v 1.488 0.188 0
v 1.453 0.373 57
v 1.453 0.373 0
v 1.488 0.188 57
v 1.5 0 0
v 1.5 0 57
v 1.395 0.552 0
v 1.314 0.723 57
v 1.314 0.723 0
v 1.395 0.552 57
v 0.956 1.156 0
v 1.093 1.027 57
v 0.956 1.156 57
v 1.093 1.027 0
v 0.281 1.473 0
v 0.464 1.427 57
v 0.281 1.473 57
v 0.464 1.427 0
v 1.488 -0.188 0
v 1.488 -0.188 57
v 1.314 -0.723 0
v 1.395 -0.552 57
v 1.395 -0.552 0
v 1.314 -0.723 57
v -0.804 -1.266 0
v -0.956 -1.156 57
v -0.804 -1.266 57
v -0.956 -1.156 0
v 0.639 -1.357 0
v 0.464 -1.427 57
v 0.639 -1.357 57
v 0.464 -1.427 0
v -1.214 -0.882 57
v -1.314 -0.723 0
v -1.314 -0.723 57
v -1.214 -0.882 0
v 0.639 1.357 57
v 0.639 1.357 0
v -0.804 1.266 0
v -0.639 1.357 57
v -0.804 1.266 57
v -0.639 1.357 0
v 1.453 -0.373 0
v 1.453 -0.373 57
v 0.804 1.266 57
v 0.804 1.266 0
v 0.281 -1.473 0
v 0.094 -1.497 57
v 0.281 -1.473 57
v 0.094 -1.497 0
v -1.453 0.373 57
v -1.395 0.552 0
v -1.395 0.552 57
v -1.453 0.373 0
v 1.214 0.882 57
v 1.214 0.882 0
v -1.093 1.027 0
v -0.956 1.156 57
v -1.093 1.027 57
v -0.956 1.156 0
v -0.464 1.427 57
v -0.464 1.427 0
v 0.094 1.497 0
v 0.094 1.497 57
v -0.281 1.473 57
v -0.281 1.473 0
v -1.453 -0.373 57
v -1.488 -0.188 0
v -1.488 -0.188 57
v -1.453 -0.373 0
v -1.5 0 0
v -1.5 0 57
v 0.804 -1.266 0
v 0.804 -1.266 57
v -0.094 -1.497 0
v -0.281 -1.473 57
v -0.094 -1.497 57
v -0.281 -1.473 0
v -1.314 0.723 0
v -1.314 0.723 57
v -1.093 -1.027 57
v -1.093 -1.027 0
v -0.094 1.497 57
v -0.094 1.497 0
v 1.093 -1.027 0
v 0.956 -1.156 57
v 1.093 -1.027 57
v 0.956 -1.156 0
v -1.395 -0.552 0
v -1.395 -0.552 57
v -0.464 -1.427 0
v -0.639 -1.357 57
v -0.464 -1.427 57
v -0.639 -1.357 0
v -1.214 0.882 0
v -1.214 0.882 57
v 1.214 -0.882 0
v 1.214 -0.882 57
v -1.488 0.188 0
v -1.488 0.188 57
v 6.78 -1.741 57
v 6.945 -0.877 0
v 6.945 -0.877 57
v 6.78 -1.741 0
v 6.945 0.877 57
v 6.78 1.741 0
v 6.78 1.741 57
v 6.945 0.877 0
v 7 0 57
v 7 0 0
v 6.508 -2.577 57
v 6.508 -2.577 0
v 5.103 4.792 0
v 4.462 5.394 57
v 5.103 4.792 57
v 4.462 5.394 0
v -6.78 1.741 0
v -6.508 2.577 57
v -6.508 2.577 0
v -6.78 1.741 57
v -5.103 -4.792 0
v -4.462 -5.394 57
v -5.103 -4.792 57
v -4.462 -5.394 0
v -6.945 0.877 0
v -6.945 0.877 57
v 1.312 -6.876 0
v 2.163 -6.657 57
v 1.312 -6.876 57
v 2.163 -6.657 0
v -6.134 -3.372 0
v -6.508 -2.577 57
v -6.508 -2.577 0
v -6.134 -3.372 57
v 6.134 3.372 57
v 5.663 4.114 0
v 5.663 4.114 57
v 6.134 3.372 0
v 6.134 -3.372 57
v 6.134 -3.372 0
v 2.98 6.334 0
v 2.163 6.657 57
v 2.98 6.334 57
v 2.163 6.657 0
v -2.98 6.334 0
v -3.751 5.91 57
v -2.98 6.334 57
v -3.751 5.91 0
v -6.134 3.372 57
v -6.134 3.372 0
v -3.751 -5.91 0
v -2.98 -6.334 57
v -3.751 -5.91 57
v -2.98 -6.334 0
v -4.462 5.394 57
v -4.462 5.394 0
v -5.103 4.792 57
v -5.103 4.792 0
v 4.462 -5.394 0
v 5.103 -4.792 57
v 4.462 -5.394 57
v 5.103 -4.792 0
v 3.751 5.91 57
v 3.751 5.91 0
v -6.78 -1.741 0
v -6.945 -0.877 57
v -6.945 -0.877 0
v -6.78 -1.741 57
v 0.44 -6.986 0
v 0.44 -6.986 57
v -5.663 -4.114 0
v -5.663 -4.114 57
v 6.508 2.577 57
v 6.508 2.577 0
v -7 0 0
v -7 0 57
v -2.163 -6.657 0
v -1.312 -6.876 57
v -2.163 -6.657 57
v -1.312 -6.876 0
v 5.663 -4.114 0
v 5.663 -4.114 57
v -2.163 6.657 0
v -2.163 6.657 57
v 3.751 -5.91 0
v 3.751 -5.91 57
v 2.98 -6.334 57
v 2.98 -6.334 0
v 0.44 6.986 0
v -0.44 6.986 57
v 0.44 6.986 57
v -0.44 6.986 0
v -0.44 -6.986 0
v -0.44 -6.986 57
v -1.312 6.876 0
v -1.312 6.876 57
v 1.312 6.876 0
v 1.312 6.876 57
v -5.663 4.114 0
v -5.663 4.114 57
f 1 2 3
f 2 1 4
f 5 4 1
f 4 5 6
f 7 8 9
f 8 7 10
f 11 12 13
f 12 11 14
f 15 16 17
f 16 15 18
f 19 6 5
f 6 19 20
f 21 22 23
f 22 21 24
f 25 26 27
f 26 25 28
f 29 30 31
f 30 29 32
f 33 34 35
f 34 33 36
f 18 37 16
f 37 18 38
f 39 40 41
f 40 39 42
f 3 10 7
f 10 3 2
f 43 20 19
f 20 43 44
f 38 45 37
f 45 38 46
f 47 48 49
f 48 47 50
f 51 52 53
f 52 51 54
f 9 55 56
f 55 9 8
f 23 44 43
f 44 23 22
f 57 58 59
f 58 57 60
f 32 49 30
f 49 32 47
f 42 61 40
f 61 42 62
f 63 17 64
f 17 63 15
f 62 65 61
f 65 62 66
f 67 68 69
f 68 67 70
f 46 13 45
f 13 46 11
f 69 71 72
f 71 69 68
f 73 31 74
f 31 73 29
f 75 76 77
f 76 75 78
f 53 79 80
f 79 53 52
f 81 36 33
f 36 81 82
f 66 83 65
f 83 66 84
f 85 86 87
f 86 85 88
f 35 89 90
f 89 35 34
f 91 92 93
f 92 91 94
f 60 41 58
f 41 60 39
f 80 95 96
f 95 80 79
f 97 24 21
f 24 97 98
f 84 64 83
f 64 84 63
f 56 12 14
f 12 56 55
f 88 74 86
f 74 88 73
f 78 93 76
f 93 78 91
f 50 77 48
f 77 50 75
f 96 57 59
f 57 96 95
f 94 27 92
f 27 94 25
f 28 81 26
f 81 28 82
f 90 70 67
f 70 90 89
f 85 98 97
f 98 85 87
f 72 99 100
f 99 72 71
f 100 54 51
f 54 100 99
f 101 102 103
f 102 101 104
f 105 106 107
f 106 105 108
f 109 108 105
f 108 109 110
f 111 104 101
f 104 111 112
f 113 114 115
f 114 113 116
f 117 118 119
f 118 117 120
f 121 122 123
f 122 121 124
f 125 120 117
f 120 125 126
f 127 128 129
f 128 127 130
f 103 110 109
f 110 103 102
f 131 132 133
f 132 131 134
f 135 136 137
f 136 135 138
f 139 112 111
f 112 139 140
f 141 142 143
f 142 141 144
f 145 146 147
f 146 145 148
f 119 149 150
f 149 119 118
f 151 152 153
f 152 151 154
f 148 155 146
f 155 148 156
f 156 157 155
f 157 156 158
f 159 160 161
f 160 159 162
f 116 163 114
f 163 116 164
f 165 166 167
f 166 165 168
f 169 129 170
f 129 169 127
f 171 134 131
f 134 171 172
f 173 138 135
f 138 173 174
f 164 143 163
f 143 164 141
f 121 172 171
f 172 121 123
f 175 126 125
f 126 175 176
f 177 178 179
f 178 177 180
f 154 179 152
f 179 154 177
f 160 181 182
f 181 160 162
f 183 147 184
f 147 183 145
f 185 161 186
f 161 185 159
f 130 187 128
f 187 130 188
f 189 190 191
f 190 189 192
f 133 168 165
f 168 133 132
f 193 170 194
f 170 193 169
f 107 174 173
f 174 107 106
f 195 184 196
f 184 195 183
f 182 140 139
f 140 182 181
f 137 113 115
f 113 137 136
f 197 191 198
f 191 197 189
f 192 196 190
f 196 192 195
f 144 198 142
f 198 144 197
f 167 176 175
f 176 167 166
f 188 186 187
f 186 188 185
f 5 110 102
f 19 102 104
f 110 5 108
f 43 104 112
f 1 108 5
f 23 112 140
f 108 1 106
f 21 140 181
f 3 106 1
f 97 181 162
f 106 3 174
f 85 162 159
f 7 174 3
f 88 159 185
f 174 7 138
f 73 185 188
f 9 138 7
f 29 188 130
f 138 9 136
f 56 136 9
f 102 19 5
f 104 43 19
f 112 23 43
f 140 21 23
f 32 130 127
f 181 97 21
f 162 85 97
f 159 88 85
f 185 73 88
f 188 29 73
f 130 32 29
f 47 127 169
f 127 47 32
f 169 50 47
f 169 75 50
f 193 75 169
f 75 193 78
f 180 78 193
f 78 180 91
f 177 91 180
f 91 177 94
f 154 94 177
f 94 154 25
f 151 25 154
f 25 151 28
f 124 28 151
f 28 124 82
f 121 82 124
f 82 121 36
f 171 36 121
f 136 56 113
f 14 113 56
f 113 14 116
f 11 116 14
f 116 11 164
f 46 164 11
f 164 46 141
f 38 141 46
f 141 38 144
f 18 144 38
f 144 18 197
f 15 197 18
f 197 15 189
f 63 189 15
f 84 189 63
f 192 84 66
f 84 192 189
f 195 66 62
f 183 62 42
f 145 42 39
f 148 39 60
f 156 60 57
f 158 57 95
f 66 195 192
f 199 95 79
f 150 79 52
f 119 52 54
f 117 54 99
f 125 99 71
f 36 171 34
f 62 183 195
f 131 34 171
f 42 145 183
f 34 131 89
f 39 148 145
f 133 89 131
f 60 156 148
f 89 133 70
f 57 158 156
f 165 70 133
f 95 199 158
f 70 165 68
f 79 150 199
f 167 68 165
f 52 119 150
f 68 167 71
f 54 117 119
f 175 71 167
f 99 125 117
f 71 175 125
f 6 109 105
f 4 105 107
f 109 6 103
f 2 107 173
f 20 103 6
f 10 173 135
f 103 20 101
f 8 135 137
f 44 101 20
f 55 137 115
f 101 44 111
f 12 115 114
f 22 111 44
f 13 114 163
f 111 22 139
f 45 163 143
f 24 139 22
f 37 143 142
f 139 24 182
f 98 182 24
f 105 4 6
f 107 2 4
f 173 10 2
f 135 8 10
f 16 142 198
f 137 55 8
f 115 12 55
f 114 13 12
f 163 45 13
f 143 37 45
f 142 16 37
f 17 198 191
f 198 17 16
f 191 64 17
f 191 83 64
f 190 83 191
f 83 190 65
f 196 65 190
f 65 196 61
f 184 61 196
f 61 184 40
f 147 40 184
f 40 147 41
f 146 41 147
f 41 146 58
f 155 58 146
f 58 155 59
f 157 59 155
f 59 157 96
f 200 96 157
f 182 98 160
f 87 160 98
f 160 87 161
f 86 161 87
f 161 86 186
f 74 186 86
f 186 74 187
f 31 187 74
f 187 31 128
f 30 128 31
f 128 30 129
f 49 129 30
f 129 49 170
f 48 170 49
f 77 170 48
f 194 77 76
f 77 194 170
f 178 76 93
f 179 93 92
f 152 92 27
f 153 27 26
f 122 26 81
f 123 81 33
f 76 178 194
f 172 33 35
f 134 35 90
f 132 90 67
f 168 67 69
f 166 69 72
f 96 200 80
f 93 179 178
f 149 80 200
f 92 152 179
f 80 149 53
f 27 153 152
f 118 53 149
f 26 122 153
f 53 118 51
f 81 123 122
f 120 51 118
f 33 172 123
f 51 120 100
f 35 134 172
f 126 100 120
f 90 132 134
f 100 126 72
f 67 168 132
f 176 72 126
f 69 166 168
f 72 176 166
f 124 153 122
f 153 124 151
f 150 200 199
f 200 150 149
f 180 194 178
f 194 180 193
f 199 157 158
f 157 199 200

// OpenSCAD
$fn = 50;


difference() {
	union() {
		cylinder(h = 57, r = 7.0000000000);
	}
	union() {
		translate(v = [0, 0, -100]) {
			cylinder(h = 200, r = 1.5000000000);
		}
		translate(v = [0, 0, -100]) {
			cylinder(h = 200, r = 1.5000000000);
		}
	}
}
